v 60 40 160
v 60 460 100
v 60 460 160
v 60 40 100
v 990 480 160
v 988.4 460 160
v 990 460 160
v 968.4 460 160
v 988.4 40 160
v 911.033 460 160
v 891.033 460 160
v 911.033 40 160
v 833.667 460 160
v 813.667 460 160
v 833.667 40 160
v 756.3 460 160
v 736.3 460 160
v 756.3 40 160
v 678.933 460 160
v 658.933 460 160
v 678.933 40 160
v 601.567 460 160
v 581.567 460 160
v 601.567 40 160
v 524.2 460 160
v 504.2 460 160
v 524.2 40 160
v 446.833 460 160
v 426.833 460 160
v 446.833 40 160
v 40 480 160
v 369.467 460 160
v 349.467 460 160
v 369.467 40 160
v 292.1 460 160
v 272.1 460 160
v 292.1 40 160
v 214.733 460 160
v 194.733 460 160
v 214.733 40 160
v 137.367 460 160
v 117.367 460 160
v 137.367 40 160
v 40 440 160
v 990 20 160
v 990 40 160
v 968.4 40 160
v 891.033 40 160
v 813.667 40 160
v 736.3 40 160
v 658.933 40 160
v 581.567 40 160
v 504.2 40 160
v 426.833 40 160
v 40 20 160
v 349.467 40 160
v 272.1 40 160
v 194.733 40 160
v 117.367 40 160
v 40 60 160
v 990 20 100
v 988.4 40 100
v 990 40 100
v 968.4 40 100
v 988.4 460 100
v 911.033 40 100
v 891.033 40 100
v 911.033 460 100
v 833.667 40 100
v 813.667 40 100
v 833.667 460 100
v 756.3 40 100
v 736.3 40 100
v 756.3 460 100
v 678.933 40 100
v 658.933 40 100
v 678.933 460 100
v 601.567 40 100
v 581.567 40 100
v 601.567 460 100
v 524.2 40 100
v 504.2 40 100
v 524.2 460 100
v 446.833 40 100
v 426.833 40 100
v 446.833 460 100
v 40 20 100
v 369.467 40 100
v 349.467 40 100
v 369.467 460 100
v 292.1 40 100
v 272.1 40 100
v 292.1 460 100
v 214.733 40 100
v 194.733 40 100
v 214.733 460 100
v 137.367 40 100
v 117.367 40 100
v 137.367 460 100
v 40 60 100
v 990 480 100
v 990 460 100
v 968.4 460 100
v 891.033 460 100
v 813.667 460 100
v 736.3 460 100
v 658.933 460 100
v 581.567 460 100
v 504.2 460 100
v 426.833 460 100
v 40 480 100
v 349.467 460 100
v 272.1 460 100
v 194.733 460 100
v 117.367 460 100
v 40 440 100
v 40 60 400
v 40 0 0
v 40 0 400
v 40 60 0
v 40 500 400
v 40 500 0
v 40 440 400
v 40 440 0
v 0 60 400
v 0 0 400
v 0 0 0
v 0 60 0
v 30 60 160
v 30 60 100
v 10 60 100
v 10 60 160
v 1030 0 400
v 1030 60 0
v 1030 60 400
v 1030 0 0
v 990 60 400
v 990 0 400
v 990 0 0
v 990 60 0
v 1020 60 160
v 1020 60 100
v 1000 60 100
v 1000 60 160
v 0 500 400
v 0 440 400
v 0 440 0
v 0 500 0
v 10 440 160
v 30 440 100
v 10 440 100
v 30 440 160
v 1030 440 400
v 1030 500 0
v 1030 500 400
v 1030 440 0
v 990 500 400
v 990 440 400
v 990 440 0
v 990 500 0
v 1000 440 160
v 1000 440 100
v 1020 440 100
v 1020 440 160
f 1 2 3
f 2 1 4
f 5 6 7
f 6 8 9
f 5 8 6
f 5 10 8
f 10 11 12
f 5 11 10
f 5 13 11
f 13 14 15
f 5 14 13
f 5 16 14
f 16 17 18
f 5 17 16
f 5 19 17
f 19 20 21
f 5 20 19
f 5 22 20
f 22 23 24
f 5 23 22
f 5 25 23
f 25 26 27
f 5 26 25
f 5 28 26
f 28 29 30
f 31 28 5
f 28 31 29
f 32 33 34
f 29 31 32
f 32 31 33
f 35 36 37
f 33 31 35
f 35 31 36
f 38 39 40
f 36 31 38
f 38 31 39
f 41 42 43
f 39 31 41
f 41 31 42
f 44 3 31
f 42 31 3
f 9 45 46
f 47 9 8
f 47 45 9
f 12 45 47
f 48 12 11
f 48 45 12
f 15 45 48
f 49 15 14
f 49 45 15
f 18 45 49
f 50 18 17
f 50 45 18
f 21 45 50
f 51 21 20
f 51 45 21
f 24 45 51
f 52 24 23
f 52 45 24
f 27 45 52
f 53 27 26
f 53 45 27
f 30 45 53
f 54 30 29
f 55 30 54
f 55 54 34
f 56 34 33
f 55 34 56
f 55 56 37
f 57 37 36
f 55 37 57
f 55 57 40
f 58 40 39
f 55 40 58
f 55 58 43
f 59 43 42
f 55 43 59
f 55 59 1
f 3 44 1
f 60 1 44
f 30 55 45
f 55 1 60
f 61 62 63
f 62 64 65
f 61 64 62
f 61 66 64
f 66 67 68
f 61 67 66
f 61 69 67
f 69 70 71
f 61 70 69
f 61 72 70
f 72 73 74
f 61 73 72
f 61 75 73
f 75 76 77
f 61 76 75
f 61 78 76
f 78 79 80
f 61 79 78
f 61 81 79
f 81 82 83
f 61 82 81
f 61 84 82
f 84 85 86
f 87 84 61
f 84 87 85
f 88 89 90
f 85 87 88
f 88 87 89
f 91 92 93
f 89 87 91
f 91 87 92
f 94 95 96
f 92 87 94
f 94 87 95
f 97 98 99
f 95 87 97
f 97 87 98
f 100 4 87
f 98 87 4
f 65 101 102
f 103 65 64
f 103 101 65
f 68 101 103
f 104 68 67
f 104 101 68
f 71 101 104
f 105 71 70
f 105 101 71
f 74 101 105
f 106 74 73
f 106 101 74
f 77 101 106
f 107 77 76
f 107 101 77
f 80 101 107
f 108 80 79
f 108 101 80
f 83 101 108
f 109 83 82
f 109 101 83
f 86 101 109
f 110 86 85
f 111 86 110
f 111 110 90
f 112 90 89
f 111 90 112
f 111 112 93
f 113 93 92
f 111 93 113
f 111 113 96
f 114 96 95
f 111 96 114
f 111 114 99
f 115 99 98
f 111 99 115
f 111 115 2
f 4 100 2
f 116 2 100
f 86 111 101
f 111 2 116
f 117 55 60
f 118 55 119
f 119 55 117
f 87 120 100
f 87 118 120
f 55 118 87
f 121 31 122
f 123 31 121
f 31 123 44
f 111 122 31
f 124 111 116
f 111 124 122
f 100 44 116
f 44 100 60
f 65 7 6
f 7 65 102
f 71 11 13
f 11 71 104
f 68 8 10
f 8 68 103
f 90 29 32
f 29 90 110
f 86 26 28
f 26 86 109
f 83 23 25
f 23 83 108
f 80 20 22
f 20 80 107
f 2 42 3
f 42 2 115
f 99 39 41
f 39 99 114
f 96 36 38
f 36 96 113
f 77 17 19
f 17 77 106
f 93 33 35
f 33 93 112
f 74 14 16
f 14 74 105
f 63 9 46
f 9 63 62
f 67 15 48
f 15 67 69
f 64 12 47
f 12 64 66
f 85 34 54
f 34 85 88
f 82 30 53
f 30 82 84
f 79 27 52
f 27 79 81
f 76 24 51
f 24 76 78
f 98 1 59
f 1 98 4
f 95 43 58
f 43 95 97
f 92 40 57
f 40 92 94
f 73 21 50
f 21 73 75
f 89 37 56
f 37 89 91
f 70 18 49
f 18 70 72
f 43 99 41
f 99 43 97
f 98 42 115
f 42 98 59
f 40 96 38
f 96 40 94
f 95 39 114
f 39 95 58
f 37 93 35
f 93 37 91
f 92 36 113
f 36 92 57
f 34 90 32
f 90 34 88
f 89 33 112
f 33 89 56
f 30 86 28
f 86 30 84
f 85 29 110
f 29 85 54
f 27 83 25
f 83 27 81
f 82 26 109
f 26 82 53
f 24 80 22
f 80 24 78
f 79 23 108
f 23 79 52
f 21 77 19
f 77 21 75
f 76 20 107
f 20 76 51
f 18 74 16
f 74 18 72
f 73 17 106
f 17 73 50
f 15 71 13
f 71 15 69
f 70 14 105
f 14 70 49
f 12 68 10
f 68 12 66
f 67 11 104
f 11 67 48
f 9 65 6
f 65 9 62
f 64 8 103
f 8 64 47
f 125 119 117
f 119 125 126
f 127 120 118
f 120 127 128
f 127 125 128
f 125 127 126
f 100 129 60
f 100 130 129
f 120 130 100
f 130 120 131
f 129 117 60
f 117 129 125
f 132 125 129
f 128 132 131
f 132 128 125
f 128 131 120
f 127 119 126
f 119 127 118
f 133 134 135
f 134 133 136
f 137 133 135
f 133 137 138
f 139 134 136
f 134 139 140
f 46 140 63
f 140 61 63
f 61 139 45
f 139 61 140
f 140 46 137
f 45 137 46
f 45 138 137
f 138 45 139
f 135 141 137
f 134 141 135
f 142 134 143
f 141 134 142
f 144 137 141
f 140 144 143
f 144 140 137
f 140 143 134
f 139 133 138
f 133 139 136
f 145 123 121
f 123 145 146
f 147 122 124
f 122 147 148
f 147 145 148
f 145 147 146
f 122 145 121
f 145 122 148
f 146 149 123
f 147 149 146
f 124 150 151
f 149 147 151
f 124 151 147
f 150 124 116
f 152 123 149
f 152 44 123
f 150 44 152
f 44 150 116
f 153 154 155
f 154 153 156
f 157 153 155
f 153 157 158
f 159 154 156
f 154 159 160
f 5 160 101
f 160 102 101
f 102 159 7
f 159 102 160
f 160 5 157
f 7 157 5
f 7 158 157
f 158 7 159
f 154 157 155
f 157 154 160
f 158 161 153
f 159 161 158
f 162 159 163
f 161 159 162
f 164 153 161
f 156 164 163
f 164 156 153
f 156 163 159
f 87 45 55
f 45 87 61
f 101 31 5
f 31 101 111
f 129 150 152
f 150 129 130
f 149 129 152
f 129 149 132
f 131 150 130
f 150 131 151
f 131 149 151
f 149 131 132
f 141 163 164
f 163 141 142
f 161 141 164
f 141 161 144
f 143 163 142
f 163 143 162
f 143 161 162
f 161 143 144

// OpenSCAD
// not final daimension
teakPlyThickness = 28;
listThickness = 20;
listWidth     = 60;

legThickness  =  listThickness*2;
legLenght     =  400;
legWidth      =  listWidth;

shelfLenght   = 950;
shelfHeight   = 100;
shelfWidth    = 380;
studsLenght   = shelfWidth
    +(listThickness*2);
studsHeight   = listWidth/2-10;

storageLenght = shelfLenght;
storageHeight = 100;
storageWidth  = shelfWidth;

lidLenght = shelfLenght+20*2;
lidWidth   = shelfWidth+10*2; 



// leg 1
translate([
    0,
    0,
    0]) 
    cube(size = [
    legThickness,
    legWidth,
    legLenght]);
    
// leg 2
translate([
    storageLenght+legThickness,
    0,
    0]) 
    cube(size = [
    legThickness,
    legWidth,
    legLenght]);
    
// leg 3
translate([
    0,
    storageWidth+legWidth,
    0]) 
    cube(size = [
    legThickness,
    legWidth,
    legLenght]);
    
// leg 4
translate([
    storageLenght+legThickness,
    storageWidth+legWidth,
    0]) 
    cube(size = [
    legThickness,
    legWidth,
    legLenght]);
    
    
// shelfStabaliserFront
translate([
    legThickness,
    listWidth/2-listThickness/2,
    shelfHeight]) 
    cube(size = [
    shelfLenght,
    listThickness,
    listWidth]);
    
// shelfStabaliserBack
translate([
    legThickness,
    listWidth/2-listThickness/2
    +storageWidth+legWidth,
    shelfHeight]) 
    cube(size = [
    shelfLenght,
    listThickness,
    listWidth]);
    
// shelfStabaliserLeft
translate([
    legThickness/2-listThickness/2,
    listWidth,
    shelfHeight]) 
    cube(size = [
    listThickness,
    shelfWidth,
    listWidth]);
    
// shelfStabaliserRight
translate([
    storageLenght+legThickness
    +legThickness/2-listThickness/2,
    listWidth,
    shelfHeight]) 
    cube(size = [
    listThickness,
    shelfWidth,
    listWidth]);
    
// shelf  (better algoritem writ it)
for(i = [
    legThickness :
    (legThickness+shelfLenght
    -listThickness*2)/12 -1.8 : 
    legThickness+shelfLenght
    -listThickness])
    translate([
        i,
        listWidth/2+listThickness/2,
        shelfHeight]) 
        cube(size = [
        listThickness,
        studsLenght,
        listWidth]);

// storageFront
// storageBack
// storageRight
// storageLeft
// storageBottom

// lid
